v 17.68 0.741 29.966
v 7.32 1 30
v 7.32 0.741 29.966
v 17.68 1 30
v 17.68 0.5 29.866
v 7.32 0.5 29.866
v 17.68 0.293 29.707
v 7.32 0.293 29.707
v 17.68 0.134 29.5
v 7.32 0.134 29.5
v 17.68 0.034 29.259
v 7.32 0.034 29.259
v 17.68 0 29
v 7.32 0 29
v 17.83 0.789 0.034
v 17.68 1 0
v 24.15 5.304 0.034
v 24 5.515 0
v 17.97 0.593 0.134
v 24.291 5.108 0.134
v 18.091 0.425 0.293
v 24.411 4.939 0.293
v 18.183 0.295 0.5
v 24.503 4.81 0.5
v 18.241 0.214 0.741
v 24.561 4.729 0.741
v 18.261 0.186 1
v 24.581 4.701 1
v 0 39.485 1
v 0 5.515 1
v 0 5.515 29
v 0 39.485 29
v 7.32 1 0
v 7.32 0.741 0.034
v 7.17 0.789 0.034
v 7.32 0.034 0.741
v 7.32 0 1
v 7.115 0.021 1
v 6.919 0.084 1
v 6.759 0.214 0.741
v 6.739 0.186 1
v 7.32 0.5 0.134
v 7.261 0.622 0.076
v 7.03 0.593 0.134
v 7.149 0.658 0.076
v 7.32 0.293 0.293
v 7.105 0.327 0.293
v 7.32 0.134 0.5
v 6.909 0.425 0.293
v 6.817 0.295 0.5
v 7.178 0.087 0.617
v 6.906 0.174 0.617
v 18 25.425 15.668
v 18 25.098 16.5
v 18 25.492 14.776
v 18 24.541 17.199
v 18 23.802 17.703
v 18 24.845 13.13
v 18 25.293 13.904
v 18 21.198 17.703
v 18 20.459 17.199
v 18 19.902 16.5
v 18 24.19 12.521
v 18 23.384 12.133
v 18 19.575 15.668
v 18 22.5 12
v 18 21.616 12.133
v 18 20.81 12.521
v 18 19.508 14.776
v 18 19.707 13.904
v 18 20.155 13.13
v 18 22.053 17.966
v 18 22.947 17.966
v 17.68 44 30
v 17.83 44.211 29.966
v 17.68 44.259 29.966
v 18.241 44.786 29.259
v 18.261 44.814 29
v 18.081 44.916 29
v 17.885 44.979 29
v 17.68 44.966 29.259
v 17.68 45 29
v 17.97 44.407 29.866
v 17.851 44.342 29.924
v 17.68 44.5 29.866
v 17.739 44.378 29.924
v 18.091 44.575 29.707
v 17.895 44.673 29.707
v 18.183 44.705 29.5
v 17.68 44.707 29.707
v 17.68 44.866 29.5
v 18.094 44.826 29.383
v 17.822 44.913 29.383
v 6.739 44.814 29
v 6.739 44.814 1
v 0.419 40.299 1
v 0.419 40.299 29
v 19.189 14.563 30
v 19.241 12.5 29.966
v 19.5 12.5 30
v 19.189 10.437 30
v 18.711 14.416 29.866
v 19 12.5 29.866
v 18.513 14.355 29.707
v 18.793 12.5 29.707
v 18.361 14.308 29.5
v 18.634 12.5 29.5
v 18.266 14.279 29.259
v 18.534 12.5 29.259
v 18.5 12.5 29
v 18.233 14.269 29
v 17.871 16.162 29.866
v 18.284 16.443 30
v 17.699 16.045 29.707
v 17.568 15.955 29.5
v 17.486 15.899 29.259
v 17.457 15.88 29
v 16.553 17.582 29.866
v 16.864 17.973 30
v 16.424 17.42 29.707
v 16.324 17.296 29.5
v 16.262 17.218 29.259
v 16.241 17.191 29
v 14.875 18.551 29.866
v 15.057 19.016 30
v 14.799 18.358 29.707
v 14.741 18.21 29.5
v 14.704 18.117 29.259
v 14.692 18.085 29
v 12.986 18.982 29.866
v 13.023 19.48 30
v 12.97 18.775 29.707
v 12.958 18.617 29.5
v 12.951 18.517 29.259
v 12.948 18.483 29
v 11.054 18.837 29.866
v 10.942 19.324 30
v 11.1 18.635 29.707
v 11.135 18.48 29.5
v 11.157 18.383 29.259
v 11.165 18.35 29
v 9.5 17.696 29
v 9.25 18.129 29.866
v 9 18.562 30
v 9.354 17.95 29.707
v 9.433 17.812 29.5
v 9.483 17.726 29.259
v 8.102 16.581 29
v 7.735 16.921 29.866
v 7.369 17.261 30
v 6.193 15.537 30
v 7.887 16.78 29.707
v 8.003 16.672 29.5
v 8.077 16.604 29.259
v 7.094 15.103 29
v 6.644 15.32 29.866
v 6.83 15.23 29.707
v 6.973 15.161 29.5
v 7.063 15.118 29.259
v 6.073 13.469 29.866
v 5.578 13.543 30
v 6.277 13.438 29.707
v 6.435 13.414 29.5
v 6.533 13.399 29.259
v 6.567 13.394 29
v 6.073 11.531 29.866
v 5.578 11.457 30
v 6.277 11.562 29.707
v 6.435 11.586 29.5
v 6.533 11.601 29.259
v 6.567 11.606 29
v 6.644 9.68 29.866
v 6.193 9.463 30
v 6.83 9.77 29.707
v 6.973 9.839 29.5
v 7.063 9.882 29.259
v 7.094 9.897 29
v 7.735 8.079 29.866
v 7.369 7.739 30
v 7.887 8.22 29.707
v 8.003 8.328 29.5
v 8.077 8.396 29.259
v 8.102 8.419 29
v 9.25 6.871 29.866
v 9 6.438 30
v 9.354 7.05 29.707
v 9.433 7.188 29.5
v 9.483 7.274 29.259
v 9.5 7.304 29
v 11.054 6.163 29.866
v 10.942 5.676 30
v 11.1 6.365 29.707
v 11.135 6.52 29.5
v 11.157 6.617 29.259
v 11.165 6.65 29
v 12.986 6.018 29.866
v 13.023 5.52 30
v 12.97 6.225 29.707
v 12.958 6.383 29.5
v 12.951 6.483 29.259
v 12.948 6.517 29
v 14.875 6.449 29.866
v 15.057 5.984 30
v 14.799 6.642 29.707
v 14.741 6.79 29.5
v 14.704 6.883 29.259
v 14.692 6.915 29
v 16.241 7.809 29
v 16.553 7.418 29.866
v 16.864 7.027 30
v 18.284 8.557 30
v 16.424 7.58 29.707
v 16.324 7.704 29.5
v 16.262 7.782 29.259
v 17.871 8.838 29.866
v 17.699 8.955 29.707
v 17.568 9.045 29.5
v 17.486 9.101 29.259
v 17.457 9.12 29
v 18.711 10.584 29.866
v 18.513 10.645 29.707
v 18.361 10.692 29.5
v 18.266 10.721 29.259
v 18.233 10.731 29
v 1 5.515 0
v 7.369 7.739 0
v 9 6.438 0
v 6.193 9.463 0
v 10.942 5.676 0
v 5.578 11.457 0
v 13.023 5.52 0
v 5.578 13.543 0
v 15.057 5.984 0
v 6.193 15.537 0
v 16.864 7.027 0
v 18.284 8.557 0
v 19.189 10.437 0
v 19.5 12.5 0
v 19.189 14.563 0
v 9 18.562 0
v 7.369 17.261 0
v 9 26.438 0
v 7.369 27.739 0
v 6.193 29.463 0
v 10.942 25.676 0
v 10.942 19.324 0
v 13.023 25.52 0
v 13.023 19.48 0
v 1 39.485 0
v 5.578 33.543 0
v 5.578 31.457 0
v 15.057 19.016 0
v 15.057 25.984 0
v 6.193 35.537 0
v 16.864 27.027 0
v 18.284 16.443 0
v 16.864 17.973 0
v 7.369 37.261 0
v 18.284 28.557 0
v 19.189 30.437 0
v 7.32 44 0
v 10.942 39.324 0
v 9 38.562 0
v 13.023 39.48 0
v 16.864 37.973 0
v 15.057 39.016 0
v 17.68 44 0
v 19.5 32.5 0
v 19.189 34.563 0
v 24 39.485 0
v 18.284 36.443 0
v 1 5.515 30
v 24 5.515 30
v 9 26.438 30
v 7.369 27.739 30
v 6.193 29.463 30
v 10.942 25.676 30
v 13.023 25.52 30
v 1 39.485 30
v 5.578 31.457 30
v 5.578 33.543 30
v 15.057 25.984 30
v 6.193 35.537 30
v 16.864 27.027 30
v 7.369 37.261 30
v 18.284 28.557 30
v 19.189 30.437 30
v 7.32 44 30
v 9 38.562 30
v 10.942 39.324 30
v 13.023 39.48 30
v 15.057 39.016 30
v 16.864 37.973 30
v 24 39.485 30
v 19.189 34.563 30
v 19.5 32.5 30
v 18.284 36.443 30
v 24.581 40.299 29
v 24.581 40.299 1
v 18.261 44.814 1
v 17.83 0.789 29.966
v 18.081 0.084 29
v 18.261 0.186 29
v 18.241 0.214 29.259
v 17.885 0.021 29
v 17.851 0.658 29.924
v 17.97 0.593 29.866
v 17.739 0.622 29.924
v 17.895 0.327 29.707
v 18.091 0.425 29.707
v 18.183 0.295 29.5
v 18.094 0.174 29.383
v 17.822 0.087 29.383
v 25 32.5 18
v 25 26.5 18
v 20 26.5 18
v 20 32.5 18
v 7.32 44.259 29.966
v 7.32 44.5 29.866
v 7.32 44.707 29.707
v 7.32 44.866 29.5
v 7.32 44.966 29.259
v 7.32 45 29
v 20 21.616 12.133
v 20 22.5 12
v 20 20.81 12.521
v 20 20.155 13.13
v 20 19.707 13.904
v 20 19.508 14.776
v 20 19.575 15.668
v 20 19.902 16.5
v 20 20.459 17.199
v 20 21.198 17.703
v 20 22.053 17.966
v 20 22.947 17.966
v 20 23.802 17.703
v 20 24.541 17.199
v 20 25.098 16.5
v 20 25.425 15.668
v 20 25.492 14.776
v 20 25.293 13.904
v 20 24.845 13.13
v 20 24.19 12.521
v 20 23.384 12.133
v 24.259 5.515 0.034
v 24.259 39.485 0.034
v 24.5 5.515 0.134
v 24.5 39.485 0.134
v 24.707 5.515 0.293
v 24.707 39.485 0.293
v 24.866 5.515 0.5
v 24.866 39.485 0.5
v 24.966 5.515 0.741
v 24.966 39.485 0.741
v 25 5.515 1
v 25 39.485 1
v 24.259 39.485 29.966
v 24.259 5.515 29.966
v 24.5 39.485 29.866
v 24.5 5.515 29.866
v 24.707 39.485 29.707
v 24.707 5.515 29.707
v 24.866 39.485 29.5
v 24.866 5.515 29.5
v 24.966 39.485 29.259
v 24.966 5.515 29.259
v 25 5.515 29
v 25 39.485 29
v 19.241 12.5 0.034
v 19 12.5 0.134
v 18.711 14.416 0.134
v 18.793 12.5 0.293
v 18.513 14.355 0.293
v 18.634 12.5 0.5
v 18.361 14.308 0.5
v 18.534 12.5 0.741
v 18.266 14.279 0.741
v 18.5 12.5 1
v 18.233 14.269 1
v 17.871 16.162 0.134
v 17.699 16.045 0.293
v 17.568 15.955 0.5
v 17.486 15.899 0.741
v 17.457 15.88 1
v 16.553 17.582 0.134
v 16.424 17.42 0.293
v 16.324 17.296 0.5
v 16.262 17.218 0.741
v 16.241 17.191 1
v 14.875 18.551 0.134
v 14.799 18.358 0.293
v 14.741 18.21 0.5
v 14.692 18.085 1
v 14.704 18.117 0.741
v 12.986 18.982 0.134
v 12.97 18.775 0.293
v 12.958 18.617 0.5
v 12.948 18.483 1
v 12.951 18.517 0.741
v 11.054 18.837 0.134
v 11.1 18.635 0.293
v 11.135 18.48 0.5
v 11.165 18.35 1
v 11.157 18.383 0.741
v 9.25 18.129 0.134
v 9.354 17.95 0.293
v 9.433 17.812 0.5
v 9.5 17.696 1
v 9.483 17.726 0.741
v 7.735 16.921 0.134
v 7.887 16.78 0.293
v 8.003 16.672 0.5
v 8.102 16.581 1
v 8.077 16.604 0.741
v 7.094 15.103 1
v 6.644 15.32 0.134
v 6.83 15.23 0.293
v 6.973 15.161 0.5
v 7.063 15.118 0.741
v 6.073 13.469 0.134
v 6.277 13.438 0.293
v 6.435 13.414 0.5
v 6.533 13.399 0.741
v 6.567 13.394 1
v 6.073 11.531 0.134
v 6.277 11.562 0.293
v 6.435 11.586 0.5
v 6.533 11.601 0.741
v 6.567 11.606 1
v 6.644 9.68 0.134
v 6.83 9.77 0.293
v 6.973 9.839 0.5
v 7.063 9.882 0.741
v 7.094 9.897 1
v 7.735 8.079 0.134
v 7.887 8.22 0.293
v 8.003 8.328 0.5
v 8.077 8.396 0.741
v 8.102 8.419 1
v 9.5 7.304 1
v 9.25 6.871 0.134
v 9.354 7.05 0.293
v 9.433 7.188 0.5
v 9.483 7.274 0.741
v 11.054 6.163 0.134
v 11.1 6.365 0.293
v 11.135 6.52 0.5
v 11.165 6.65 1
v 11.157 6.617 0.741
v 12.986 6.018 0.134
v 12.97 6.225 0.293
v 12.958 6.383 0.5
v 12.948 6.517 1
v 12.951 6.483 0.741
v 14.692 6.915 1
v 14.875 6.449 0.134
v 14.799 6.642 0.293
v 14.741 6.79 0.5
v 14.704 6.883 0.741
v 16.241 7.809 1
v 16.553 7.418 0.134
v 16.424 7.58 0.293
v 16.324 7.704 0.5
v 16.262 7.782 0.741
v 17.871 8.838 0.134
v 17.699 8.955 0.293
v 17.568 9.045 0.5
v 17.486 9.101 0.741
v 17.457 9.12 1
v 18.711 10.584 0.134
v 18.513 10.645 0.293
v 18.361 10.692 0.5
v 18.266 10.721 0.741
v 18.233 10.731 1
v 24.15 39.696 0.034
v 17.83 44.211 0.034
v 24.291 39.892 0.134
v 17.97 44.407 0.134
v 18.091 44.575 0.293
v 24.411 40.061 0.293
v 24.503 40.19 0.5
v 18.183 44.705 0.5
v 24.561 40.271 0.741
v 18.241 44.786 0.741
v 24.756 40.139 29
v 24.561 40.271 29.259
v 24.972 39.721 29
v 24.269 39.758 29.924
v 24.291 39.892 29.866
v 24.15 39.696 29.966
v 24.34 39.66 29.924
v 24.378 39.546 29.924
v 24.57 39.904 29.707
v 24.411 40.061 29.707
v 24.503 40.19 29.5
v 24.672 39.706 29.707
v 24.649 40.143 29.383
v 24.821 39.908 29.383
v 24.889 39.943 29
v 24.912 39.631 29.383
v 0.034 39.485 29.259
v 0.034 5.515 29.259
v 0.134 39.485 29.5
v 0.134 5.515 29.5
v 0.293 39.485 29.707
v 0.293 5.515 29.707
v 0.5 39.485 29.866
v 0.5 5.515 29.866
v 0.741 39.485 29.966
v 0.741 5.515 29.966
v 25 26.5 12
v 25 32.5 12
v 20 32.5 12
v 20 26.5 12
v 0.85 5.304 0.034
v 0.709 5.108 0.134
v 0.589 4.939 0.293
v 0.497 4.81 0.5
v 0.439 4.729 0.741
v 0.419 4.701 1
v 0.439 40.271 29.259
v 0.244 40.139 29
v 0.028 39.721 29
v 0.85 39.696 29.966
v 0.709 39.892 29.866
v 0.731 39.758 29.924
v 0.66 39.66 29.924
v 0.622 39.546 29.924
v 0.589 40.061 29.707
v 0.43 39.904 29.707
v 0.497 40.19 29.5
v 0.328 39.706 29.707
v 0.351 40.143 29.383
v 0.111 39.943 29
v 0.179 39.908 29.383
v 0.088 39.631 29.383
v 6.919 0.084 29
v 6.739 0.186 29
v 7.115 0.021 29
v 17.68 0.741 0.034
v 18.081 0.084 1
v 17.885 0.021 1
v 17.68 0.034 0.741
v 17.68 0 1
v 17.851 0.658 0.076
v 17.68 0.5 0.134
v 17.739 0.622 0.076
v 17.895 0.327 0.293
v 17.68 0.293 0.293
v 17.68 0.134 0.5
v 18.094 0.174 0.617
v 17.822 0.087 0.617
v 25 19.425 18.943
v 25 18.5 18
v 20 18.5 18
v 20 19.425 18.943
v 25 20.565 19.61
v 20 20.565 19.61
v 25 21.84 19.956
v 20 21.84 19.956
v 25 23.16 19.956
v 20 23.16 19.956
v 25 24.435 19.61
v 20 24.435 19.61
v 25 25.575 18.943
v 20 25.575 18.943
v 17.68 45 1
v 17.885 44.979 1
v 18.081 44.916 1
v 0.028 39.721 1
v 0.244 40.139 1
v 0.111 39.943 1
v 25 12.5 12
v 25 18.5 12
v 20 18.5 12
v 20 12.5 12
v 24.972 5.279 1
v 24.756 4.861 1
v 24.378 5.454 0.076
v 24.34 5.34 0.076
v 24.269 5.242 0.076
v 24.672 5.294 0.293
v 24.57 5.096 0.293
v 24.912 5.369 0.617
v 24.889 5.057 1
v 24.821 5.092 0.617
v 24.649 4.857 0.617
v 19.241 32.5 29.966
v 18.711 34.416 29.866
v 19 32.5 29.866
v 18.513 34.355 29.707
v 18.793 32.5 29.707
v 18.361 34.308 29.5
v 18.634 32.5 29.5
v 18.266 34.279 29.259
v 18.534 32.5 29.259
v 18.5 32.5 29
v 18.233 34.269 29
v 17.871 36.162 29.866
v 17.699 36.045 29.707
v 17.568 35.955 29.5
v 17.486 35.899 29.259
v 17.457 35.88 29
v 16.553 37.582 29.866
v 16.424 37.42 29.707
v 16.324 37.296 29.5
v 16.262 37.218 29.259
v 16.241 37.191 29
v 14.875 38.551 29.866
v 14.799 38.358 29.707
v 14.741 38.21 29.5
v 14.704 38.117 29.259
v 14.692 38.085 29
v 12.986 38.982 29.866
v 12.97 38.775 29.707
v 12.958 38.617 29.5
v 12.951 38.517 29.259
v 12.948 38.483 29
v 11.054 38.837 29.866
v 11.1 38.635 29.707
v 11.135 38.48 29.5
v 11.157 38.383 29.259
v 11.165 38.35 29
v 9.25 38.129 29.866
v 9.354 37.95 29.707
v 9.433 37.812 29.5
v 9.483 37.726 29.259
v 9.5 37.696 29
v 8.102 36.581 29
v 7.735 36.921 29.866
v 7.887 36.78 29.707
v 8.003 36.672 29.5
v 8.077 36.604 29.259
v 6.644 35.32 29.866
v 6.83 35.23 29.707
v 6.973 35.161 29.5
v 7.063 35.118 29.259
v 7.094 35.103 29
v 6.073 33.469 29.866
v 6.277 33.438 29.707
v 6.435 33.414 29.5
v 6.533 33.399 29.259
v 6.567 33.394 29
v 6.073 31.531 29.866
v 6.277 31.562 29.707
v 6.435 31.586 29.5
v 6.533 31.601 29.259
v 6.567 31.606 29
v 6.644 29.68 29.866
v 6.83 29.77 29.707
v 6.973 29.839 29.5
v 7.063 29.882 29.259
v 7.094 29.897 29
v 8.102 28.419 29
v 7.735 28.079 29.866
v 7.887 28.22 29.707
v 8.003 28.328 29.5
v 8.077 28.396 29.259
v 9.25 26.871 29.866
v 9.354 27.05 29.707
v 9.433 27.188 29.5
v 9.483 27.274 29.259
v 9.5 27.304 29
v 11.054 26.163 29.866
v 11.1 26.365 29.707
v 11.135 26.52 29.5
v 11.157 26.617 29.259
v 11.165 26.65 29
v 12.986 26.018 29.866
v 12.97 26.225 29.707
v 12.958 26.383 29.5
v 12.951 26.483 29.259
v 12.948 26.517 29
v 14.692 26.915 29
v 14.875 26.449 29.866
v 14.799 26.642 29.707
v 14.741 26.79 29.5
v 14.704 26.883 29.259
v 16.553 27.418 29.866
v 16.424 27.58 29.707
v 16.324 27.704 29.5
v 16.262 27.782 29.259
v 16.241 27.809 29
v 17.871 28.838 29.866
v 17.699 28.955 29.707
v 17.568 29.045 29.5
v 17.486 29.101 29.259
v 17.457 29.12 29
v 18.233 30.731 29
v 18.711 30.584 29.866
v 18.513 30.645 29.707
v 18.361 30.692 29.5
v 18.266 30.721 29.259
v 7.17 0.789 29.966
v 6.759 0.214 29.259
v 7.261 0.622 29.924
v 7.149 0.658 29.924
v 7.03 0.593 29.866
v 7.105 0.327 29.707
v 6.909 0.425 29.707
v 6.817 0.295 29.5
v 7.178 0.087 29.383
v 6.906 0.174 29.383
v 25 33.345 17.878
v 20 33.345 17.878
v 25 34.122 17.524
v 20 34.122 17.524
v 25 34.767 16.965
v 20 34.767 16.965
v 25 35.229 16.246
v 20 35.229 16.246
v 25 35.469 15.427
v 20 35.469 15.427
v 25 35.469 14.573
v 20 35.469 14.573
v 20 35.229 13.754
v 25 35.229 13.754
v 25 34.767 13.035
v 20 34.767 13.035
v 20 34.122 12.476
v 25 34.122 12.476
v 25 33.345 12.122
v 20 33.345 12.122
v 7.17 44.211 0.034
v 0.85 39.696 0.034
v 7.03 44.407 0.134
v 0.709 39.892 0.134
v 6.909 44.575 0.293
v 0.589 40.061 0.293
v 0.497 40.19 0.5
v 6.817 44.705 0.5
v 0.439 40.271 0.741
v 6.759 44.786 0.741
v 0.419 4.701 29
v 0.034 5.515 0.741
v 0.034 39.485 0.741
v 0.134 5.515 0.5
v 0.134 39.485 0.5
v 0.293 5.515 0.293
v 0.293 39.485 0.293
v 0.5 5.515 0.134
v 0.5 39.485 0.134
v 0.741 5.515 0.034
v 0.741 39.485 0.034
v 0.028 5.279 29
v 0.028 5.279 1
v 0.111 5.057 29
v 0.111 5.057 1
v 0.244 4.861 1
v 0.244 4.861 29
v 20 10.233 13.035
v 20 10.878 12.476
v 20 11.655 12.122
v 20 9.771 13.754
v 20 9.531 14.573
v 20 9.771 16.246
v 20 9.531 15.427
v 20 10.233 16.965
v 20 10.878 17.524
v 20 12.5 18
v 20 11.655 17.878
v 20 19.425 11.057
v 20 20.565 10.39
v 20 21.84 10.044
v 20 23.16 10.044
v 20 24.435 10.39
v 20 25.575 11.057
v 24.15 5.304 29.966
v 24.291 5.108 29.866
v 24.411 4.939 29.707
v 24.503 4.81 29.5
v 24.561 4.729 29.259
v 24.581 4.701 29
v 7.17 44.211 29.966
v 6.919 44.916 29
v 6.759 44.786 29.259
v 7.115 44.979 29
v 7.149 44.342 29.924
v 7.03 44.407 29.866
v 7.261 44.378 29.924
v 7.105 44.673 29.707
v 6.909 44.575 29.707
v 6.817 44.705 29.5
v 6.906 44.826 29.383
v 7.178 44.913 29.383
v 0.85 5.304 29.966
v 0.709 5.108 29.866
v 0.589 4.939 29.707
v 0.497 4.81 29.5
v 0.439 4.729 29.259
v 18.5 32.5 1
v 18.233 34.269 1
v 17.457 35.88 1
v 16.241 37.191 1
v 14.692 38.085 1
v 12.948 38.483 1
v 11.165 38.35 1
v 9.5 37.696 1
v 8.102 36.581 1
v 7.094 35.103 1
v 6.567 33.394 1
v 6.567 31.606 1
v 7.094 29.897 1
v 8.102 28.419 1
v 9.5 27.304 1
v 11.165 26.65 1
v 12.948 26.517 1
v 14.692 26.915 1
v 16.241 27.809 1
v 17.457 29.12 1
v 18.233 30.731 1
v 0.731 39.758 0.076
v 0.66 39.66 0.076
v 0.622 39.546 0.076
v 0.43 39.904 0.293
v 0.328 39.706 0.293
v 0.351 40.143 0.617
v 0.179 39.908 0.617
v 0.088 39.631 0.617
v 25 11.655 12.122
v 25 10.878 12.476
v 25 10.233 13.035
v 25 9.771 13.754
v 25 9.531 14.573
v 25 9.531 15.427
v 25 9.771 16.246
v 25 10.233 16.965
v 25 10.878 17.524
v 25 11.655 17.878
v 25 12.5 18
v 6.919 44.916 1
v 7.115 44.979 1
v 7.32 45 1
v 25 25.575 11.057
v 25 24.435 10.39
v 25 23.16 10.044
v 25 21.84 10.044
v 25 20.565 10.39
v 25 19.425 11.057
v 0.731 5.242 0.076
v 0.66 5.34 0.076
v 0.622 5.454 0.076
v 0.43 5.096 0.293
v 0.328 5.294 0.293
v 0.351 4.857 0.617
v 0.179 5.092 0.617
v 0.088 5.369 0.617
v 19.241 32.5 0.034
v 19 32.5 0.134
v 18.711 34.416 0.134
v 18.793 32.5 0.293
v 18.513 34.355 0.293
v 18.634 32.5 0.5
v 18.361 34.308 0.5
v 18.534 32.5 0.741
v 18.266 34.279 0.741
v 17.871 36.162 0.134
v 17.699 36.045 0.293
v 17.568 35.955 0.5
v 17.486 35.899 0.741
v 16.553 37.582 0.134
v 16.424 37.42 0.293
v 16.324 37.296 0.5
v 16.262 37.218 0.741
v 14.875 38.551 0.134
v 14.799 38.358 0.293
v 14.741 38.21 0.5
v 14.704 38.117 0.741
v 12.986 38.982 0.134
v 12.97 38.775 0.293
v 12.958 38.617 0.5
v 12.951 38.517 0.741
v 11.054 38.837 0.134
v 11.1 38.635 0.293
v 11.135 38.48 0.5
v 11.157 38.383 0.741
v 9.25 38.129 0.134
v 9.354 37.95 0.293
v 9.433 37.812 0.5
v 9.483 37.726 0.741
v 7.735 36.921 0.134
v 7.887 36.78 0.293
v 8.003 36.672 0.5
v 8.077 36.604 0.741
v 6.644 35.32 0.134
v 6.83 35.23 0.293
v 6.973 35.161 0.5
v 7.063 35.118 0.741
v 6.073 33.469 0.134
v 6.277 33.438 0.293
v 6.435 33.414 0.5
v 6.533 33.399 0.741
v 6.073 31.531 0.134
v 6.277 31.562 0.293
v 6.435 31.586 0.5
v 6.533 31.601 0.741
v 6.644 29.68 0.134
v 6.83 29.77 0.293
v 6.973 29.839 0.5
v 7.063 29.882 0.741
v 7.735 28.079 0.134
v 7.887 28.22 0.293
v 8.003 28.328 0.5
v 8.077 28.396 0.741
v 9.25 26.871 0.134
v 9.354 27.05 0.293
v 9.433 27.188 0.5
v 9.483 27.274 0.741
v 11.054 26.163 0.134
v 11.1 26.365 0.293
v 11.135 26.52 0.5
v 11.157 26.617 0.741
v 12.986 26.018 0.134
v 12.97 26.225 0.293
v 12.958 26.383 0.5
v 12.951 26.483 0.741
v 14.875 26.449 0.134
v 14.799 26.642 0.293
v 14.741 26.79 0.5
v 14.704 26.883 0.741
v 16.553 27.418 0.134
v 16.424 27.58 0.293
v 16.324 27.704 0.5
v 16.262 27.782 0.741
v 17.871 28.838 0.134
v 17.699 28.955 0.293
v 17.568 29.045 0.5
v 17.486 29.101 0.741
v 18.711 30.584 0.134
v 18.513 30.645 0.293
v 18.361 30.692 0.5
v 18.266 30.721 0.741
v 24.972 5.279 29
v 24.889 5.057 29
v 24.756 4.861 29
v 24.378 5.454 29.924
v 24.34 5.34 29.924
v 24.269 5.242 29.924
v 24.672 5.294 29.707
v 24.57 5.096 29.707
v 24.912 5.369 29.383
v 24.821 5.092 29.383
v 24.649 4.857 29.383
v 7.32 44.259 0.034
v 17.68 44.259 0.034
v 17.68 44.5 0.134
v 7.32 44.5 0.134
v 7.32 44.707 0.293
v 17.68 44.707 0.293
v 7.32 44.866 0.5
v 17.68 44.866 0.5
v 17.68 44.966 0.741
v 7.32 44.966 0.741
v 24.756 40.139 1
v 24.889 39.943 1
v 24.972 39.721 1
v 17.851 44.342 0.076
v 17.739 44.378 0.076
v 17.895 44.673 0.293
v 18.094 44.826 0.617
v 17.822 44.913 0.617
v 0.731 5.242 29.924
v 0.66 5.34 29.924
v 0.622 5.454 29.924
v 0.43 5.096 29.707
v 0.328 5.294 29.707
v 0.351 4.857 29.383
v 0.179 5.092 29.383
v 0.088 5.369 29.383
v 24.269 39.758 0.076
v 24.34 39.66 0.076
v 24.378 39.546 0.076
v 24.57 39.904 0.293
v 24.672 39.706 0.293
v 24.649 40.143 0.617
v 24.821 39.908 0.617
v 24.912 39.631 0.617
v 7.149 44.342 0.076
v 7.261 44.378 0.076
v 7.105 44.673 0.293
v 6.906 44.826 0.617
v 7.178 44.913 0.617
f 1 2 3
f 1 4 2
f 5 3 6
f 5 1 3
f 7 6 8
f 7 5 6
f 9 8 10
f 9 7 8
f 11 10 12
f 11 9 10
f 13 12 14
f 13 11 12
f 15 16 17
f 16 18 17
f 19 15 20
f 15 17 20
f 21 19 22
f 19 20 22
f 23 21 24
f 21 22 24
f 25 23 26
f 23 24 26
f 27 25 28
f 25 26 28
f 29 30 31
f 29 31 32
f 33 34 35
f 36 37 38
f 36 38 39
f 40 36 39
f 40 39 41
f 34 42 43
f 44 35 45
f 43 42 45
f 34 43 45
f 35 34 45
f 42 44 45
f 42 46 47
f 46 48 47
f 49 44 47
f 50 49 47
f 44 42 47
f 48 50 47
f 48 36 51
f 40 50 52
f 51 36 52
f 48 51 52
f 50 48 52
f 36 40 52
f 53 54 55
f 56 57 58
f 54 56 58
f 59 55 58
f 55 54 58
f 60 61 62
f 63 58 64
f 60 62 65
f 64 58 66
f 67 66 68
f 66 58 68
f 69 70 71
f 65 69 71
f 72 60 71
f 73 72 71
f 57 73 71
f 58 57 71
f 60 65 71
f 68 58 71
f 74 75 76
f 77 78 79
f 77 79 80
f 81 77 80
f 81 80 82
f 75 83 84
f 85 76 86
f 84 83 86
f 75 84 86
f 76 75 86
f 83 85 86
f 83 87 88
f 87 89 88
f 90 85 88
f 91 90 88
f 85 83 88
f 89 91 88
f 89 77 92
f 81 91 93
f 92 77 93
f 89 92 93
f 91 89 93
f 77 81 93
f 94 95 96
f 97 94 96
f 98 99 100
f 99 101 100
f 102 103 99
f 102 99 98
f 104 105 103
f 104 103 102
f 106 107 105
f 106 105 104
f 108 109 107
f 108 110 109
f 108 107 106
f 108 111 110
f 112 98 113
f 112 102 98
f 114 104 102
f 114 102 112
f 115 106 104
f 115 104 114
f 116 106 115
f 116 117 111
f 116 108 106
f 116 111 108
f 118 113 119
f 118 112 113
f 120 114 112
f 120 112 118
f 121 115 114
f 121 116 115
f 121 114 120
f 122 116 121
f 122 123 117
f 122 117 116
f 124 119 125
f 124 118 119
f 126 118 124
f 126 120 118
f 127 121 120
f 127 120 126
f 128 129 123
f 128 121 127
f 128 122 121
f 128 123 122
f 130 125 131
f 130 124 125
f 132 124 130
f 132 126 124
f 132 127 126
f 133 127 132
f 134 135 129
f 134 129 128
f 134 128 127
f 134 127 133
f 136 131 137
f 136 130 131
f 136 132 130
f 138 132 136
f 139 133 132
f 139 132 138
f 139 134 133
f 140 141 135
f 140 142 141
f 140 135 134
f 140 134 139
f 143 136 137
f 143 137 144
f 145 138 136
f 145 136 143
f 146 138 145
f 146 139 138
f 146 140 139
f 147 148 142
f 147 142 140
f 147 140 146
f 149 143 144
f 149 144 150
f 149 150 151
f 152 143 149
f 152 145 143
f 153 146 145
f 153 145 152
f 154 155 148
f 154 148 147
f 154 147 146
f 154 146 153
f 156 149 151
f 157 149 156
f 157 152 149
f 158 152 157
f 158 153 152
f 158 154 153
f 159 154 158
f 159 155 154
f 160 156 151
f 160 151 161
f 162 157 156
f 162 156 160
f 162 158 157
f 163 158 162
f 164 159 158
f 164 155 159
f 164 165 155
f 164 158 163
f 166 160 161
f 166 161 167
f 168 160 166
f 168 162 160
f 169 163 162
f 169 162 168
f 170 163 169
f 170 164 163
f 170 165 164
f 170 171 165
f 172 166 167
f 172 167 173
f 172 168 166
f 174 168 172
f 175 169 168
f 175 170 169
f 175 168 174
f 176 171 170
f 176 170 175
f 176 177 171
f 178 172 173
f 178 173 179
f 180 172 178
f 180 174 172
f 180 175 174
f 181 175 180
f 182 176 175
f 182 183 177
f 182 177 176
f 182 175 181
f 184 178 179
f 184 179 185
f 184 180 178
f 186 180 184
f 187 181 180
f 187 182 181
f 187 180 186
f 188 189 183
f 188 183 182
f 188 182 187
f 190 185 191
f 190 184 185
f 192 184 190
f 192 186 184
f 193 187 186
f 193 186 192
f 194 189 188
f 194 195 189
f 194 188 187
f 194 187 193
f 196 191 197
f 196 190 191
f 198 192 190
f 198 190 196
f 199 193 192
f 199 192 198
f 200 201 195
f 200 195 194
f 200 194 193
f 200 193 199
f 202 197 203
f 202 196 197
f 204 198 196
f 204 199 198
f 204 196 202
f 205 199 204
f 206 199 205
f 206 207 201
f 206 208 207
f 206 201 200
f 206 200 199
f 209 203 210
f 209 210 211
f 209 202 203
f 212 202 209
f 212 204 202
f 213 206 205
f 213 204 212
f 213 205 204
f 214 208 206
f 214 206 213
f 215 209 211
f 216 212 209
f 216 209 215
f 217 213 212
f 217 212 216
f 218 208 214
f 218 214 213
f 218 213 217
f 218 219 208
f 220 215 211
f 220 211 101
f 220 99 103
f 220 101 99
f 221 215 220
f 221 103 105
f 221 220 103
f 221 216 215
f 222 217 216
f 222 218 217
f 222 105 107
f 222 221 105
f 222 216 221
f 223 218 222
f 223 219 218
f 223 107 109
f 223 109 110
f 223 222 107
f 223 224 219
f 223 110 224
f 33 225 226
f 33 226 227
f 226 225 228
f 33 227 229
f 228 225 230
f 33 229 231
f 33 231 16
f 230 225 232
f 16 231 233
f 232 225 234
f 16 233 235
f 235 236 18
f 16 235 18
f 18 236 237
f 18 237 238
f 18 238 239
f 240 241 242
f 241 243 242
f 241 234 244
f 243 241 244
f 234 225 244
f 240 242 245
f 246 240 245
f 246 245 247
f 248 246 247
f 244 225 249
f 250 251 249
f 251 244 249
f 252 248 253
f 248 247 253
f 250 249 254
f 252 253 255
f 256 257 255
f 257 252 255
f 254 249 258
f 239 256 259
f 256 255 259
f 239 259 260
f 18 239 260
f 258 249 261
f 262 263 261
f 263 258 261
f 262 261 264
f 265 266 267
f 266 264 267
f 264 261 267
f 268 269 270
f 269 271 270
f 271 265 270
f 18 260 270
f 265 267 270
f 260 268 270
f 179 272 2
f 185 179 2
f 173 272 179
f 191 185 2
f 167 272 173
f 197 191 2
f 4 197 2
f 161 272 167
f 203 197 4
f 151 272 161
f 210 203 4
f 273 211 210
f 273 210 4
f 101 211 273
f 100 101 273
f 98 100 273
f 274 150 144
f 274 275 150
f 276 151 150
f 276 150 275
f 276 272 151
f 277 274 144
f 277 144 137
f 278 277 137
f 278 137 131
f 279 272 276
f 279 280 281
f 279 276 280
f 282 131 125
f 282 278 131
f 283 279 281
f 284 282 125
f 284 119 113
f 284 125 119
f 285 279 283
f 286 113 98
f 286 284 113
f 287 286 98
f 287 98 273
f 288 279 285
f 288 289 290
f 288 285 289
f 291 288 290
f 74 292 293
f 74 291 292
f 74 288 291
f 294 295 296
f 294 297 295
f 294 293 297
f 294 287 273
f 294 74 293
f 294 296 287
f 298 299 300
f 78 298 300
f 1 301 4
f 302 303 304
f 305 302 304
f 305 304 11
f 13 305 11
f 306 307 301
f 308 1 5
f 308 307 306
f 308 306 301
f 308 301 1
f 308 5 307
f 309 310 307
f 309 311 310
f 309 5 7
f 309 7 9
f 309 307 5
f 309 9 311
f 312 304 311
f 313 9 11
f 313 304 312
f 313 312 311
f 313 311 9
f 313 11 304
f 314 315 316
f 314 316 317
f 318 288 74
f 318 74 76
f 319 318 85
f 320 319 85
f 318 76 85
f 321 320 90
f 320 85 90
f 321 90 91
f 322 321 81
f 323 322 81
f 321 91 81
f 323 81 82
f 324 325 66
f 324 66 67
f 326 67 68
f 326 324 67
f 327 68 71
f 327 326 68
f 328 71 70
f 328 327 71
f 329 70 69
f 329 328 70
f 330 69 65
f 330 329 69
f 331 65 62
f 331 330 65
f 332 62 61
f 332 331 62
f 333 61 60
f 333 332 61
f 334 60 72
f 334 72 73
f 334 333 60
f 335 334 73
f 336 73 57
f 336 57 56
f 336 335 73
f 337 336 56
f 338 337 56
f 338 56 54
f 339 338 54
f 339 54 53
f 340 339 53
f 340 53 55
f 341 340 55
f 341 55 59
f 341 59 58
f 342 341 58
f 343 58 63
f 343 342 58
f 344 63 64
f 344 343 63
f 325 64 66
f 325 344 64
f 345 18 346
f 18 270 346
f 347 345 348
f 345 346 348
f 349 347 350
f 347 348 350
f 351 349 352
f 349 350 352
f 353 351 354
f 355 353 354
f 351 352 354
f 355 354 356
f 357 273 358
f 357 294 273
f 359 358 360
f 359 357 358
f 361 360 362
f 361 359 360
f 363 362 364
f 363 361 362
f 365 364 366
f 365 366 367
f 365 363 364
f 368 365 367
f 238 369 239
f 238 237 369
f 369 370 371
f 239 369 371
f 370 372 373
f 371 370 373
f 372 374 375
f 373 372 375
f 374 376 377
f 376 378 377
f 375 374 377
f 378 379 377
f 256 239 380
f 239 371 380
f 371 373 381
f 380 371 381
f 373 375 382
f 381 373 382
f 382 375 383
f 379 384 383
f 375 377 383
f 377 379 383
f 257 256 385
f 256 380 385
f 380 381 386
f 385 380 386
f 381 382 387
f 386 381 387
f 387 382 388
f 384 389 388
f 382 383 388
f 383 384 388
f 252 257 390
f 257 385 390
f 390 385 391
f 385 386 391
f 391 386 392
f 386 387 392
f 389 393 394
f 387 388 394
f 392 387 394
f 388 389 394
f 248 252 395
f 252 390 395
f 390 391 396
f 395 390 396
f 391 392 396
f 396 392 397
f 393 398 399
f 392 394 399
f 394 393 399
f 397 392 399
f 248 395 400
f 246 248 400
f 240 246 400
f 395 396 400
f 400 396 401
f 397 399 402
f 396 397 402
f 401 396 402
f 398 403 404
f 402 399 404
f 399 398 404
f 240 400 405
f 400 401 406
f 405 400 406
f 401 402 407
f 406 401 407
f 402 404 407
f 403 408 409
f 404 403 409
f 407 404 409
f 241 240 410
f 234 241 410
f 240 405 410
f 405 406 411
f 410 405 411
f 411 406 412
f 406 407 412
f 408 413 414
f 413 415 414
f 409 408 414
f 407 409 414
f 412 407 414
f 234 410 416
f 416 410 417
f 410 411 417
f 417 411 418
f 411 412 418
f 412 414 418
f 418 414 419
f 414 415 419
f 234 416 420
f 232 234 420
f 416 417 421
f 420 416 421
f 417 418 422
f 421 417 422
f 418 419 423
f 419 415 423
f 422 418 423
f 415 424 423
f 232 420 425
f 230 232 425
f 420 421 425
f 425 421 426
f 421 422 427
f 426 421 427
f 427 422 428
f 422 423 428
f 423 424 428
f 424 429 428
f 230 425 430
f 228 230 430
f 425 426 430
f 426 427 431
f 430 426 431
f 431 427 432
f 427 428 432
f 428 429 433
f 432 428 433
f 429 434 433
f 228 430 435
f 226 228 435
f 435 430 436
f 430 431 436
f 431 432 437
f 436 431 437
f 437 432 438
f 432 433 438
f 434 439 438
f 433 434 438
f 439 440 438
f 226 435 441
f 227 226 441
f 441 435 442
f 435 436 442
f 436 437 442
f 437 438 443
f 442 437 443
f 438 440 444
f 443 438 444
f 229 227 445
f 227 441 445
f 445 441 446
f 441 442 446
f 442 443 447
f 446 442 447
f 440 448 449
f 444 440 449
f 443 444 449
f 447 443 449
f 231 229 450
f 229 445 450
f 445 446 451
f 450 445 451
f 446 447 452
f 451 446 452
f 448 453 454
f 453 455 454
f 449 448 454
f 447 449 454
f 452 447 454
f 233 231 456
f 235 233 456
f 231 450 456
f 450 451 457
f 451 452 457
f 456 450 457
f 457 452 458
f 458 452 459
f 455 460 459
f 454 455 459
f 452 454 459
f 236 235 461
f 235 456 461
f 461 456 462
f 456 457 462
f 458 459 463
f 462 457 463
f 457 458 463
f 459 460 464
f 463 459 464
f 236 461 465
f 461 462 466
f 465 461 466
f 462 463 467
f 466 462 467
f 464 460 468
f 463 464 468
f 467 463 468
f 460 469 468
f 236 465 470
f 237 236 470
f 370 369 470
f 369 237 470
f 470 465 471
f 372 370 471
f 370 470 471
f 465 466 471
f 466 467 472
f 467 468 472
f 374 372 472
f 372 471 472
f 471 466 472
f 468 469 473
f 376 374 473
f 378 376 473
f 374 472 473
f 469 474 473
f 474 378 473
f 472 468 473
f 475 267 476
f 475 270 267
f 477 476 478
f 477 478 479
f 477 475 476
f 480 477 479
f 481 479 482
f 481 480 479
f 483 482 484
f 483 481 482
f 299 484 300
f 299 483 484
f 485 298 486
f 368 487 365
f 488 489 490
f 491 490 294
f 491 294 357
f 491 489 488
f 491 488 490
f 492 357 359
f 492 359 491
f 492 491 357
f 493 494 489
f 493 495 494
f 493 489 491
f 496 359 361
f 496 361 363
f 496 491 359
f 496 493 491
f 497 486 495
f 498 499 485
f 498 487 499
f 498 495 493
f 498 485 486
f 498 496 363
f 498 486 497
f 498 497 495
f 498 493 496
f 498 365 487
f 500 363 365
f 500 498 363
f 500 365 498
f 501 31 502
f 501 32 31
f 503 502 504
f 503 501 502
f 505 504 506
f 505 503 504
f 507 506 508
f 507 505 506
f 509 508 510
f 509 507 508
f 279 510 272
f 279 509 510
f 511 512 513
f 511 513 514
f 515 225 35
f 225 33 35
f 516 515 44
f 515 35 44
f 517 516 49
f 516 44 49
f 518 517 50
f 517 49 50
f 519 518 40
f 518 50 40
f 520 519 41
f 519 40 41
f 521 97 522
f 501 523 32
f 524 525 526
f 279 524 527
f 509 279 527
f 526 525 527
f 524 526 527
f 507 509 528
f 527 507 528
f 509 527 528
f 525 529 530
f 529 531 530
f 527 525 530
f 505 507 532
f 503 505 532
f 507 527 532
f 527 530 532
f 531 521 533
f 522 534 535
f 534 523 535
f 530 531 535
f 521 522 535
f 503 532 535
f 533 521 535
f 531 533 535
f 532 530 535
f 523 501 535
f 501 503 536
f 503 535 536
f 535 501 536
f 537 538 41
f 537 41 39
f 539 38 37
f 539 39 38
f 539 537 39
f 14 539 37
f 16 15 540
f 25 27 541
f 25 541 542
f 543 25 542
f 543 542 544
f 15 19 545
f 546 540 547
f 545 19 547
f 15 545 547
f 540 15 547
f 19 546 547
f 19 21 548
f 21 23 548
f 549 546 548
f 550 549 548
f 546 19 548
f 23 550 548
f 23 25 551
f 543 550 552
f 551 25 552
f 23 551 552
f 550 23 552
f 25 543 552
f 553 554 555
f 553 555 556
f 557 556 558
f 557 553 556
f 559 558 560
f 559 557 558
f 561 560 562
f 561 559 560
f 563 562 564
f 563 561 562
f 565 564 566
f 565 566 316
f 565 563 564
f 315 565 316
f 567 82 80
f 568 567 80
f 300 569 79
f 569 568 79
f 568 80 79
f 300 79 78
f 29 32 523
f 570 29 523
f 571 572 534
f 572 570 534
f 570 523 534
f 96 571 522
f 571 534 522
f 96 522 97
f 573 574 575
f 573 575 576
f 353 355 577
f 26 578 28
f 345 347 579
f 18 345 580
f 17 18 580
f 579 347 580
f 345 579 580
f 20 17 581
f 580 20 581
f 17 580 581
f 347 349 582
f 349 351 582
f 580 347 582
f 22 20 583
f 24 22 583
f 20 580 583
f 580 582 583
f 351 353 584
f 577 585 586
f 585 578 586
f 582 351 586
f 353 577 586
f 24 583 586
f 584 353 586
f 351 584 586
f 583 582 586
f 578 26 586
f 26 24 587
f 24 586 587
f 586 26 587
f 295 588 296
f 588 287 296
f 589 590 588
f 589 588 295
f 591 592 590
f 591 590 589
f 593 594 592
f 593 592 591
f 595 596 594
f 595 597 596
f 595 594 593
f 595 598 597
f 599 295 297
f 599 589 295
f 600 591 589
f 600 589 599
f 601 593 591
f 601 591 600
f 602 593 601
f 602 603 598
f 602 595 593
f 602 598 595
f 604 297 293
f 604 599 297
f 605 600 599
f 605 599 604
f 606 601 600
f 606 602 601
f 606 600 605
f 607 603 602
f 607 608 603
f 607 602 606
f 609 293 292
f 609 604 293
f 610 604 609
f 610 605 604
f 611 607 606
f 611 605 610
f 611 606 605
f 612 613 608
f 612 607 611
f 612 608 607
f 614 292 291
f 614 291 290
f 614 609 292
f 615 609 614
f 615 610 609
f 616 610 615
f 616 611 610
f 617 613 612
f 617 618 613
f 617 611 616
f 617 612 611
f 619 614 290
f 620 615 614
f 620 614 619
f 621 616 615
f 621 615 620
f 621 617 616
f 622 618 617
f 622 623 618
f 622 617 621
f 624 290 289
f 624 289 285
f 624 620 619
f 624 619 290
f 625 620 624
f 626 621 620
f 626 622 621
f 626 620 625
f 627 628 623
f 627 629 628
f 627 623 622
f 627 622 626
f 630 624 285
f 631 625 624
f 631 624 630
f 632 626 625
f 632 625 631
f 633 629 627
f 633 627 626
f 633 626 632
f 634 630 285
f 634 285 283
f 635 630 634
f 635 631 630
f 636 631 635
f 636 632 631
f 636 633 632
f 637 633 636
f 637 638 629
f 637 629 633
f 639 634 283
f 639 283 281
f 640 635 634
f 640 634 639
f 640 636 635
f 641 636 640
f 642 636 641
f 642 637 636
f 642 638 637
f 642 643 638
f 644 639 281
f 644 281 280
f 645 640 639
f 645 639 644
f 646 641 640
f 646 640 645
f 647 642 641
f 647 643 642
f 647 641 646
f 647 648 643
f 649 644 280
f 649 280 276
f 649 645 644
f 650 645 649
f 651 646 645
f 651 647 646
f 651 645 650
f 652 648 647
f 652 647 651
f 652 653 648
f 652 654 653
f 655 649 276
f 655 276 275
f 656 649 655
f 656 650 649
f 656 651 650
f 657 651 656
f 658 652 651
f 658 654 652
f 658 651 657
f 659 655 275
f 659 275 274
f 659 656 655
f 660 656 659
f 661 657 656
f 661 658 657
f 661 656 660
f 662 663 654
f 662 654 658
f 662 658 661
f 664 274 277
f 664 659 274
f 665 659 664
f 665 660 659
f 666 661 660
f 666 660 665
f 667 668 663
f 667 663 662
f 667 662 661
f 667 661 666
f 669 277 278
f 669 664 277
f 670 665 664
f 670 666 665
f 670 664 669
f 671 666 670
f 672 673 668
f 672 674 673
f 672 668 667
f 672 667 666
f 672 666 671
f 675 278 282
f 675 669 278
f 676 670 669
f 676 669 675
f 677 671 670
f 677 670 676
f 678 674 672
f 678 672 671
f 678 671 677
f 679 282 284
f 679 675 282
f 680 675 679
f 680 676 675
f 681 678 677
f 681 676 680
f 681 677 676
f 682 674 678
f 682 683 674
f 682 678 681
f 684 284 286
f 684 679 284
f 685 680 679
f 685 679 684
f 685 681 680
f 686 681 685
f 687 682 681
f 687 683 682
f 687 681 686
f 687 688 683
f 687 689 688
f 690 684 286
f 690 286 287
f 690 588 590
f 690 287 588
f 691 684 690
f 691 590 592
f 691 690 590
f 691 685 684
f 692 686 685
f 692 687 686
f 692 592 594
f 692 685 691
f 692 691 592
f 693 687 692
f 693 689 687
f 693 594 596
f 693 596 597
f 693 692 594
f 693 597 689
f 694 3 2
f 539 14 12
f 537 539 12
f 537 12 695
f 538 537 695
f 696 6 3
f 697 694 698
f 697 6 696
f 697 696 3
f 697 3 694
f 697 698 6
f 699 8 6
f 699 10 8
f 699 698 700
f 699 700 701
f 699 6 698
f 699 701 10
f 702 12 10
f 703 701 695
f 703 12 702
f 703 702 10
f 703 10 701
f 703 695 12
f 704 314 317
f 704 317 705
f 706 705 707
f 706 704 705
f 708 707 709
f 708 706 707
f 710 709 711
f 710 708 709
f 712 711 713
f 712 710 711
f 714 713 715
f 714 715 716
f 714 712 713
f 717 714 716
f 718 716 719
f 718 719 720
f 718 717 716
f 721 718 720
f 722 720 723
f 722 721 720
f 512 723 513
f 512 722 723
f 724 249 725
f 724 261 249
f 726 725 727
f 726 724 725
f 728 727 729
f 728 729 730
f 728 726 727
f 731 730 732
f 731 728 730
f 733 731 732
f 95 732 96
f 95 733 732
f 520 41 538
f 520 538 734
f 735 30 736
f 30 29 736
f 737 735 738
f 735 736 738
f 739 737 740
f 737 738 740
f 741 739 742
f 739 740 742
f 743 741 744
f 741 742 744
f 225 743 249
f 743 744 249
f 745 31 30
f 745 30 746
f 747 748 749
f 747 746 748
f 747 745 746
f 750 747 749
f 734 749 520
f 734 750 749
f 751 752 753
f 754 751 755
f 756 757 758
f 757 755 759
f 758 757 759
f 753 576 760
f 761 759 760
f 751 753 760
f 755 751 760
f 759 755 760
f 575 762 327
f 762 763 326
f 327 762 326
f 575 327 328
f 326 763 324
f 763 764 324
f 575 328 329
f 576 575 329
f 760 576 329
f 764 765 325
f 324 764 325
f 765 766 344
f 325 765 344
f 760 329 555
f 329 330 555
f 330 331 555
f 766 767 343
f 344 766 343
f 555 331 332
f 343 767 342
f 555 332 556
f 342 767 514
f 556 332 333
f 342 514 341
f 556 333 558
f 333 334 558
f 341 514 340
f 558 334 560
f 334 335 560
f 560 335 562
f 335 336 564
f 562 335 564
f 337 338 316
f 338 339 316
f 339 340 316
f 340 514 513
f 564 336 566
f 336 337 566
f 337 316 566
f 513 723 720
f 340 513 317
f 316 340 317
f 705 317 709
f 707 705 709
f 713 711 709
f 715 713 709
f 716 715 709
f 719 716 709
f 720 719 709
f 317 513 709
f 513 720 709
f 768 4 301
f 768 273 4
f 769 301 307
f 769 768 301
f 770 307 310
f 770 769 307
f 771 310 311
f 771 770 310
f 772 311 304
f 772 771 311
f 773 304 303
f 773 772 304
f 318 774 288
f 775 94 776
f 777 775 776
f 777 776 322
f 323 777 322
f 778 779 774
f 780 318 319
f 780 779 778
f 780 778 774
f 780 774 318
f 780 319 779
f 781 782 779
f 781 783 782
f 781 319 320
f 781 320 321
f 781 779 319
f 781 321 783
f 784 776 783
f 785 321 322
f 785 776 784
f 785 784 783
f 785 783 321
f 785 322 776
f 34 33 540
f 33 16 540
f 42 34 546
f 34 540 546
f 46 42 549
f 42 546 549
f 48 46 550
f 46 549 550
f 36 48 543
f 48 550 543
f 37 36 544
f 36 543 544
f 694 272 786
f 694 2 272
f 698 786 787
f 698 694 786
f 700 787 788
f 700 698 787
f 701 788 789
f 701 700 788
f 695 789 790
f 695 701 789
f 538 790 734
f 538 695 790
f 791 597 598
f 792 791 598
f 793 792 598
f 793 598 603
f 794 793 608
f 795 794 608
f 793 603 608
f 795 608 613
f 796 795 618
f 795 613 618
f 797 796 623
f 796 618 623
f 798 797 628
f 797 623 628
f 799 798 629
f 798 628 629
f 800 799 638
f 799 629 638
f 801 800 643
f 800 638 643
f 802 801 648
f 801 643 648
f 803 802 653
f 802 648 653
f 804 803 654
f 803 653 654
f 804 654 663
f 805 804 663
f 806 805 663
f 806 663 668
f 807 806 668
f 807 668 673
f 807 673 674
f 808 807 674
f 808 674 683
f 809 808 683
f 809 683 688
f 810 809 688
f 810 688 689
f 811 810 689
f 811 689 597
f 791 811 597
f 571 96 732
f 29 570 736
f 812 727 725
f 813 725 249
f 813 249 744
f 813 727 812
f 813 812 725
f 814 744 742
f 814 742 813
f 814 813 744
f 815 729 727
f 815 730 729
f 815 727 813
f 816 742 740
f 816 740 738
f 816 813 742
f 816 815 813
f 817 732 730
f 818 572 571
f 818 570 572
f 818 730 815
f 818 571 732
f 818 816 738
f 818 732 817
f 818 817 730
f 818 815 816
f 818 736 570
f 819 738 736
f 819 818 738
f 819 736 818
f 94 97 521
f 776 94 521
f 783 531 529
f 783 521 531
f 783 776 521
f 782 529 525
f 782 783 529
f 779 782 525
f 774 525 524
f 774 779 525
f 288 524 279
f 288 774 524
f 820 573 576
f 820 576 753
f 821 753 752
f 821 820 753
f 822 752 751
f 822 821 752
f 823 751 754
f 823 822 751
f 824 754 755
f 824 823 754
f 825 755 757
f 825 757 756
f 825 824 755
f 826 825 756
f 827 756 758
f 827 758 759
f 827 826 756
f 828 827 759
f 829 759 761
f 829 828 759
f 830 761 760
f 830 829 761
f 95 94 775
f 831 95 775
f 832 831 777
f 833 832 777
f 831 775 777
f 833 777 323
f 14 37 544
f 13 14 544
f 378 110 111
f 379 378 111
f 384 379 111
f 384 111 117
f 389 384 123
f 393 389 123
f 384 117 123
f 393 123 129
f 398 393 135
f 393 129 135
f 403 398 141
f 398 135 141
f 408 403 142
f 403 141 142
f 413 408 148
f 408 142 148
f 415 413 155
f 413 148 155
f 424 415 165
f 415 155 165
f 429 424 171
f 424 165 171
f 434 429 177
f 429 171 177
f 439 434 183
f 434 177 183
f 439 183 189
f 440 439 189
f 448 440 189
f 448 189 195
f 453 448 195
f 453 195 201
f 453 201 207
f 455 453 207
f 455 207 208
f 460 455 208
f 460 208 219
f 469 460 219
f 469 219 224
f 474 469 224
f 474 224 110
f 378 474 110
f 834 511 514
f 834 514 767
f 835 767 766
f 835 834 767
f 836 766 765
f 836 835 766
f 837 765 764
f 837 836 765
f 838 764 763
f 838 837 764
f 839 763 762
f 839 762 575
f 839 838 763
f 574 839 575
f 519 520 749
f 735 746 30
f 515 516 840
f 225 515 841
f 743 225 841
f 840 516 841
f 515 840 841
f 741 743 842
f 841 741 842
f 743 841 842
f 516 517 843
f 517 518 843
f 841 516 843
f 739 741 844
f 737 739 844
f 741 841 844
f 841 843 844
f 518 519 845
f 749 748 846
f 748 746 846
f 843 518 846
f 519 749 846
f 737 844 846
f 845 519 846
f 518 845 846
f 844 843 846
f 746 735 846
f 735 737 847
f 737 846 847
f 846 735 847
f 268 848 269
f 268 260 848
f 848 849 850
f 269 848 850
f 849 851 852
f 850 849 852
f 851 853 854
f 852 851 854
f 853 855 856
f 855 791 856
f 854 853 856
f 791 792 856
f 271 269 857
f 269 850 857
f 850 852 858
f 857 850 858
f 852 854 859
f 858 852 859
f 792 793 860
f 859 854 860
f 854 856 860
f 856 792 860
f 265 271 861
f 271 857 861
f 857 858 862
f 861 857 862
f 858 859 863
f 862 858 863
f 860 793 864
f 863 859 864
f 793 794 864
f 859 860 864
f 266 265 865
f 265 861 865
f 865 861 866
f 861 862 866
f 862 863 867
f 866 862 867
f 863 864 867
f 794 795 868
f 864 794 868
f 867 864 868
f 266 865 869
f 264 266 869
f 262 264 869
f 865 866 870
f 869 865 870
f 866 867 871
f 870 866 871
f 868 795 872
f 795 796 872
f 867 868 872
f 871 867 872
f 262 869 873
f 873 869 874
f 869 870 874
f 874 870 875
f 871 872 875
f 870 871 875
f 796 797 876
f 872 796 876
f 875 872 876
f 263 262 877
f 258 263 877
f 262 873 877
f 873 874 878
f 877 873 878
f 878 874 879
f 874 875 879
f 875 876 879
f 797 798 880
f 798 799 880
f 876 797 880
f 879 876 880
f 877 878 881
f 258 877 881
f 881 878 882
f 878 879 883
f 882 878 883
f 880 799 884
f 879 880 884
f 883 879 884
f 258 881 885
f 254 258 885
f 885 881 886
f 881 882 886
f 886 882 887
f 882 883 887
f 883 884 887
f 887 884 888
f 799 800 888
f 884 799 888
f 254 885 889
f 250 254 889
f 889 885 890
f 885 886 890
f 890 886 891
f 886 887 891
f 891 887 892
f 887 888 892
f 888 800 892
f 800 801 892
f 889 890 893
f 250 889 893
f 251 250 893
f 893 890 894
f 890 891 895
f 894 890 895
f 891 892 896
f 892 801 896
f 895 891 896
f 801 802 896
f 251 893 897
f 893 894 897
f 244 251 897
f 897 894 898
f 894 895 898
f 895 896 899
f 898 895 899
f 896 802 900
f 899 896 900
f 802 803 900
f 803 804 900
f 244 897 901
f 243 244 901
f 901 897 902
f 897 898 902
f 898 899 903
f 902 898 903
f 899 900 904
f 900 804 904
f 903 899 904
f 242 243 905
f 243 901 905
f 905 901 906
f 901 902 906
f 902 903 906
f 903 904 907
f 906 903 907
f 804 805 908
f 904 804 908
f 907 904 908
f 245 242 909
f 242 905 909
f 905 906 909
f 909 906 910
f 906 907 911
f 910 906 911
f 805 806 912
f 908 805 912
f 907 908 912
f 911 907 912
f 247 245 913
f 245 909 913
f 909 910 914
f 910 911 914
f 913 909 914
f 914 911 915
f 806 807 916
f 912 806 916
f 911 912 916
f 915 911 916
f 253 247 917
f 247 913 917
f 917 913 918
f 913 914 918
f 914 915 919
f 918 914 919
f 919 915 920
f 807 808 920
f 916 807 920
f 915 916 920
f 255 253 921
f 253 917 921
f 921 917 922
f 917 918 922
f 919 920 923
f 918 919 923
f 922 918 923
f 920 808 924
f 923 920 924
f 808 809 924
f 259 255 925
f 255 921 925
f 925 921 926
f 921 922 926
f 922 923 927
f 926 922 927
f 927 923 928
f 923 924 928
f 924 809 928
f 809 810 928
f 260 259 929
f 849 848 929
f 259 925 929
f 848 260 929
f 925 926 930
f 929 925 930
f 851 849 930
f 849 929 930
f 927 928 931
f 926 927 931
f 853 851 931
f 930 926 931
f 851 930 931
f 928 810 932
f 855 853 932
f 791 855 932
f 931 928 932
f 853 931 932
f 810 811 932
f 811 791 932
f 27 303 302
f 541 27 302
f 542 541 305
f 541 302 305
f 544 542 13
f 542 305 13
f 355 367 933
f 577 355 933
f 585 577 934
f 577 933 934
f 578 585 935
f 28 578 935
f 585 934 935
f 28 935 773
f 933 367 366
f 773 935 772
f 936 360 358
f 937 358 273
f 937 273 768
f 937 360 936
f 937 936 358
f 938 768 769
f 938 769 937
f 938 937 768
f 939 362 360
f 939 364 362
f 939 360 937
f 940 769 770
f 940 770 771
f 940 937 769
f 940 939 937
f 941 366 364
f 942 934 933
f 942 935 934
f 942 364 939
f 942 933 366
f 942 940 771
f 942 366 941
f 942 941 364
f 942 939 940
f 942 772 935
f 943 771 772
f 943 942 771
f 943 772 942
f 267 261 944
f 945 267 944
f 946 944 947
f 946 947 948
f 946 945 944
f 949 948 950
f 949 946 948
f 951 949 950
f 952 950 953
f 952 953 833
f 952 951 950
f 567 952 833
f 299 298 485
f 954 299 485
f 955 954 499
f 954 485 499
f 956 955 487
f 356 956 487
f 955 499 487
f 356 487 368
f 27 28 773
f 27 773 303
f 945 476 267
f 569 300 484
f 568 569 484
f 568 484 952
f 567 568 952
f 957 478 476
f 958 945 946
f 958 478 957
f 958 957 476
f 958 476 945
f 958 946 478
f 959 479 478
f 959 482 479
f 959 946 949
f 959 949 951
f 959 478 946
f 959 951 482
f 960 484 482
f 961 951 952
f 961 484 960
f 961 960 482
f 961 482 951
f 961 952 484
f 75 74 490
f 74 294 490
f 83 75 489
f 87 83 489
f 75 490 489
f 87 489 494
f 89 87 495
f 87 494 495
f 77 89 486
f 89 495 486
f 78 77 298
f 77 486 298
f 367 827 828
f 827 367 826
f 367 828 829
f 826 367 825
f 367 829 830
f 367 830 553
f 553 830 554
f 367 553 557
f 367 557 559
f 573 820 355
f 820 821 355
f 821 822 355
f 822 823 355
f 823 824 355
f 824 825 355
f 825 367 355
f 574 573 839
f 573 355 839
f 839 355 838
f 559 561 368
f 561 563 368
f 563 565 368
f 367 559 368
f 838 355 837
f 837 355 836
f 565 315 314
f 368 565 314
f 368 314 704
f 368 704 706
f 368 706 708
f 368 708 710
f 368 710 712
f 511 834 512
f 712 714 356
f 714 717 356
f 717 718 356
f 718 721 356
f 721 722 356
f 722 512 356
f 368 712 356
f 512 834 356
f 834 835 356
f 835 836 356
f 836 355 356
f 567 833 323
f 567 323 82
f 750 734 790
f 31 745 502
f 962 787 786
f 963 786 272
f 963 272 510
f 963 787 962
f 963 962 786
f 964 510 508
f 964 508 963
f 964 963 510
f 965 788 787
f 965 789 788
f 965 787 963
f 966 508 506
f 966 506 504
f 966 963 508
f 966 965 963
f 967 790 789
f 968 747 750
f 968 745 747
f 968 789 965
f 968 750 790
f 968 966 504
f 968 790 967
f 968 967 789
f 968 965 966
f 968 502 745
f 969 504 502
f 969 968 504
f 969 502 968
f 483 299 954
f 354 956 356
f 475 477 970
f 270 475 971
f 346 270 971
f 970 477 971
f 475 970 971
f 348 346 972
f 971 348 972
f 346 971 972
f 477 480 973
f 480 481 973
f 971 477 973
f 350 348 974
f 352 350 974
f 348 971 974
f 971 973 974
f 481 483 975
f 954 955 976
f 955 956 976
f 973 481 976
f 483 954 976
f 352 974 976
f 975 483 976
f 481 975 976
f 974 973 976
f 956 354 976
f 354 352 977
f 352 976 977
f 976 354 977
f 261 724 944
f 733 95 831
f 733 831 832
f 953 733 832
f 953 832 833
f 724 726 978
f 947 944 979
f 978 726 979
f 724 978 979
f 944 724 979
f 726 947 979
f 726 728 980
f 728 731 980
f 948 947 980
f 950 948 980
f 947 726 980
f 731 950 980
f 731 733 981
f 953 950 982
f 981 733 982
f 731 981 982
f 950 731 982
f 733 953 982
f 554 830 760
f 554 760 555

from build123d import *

# Parameters (mm, degrees)
SKETCH1_W                = 25
SKETCH1_H                = 45
BOSS_EXTRUDE1_DEPTH      = 30
CUT_EXTRUDE1_REACH       = 61.582
SKETCH2_R                = 6
CUT_EXTRUDE10_DEPTH      = 5
CUT_EXTRUDE11_DEPTH      = 60.581876439
CUT_EXTRUDE11_DEPTH_BACK = 60.581876439
CUT_EXTRUDE23_START      = -20
SKETCH9_R                = 3
CUT_EXTRUDE23_DEPTH      = 2
FILLET1_R                = 1


with BuildPart() as part:
    # Sketch1 → Boss-Extrude1 (new body)
    with BuildSketch(Plane.XY):
        with Locations((12.5, 22.5)):
            Rectangle(SKETCH1_W, SKETCH1_H)
    extrude(amount=BOSS_EXTRUDE1_DEPTH)

    # Sketch2 → Cut-Extrude1 (cut, up to next)
    with BuildSketch(Plane.XY.offset(30), mode=Mode.PRIVATE) as cut_extrude1_sk1:
        with Locations((12.5, 12.5)):
            Circle(SKETCH2_R)
    cut_extrude1_tool1 = extrude(cut_extrude1_sk1.sketch, amount=-CUT_EXTRUDE1_REACH, mode=Mode.PRIVATE) & part.part
    # Sketch2 → Cut-Extrude1 (cut, up to next)
    with BuildSketch(Plane.XY.offset(30), mode=Mode.PRIVATE) as cut_extrude1_sk2:
        with Locations((12.5, 32.5)):
            Circle(SKETCH2_R)
    cut_extrude1_tool2 = extrude(cut_extrude1_sk2.sketch, amount=-CUT_EXTRUDE1_REACH, mode=Mode.PRIVATE) & part.part
    add(cut_extrude1_tool1.solids().sort_by_distance((12.5, 12.5, 30))[0], mode=Mode.SUBTRACT)
    add(cut_extrude1_tool2.solids().sort_by_distance((12.5, 32.5, 30))[0], mode=Mode.SUBTRACT)

    # Sketch3 → Cut-Extrude10 (cut)
    with BuildSketch(Plane(origin=(25, 0, 0), x_dir=(0, 0, -1), z_dir=(1, 0, 0))):
        with BuildLine():
            Line((-12, 32.5), (-12, 26.5))
            ThreePointArc((-12, 26.5), (-10, 22.5), (-12, 18.5))
            Line((-12, 18.5), (-12, 12.5))
            ThreePointArc((-12, 12.5), (-15, 9.5), (-18, 12.5))
            Line((-18, 12.5), (-18, 18.5))
            ThreePointArc((-18, 18.5), (-20, 22.5), (-18, 26.5))
            Line((-18, 26.5), (-18, 32.5))
            ThreePointArc((-18, 32.5), (-15, 35.5), (-12, 32.5))
        make_face()
    extrude(amount=-CUT_EXTRUDE10_DEPTH, mode=Mode.SUBTRACT)

    # Sketch8 → Cut-Extrude11 (cut, two sides: drawn at the far end of the back side and taken through both)
    with BuildSketch(Plane.XY.offset(30).offset(-CUT_EXTRUDE11_DEPTH_BACK)):
        Polygon((7, 45), (0, 40), (0, 45), align=None)
        Polygon((0, 0), (7, 0), (0, 5), align=None)
        Polygon((25, 45), (25, 40), (18, 45), align=None)
        Polygon((25, 5), (18, 0), (25, 0), align=None)
    extrude(amount=CUT_EXTRUDE11_DEPTH + CUT_EXTRUDE11_DEPTH_BACK, mode=Mode.SUBTRACT)

    # Sketch9 → Cut-Extrude23 (cut)
    with BuildSketch(Plane.ZY.offset(CUT_EXTRUDE23_START)):
        with Locations(Location((15, 22.5, 0), (0, 0, 180))):
            Circle(SKETCH9_R)
    extrude(amount=CUT_EXTRUDE23_DEPTH, mode=Mode.SUBTRACT)

    # Fillet1
    fillet1_edges = [part.edges().sort_by_distance(p)[0] for p in [
        (6.5, 12.5, 0),
        (6.5, 12.5, 30),
        (6.5, 32.5, 0),
        (6.5, 32.5, 30),
        (0, 22.5, 0),
        (12.5, 45, 0),
        (25, 22.5, 0),
        (12.5, 0, 0),
        (0, 22.5, 30),
        (12.5, 0, 30),
        (25, 22.5, 30),
        (12.5, 45, 30),
        (18, 45, 15),
        (25, 40, 15),
        (21.5, 42.5, 30),
        (21.5, 42.5, 0),
        (0, 5, 15),
        (3.5, 2.5, 30),
        (3.5, 2.5, 0),
        (7, 0, 15),
        (18, 0, 15),
        (21.5, 2.5, 30),
        (21.5, 2.5, 0),
        (25, 5, 15),
        (0, 40, 15),
        (7, 45, 15),
        (3.5, 42.5, 30),
        (3.5, 42.5, 0),
    ]]
    fillet(fillet1_edges, radius=FILLET1_R)


solid = part.part
